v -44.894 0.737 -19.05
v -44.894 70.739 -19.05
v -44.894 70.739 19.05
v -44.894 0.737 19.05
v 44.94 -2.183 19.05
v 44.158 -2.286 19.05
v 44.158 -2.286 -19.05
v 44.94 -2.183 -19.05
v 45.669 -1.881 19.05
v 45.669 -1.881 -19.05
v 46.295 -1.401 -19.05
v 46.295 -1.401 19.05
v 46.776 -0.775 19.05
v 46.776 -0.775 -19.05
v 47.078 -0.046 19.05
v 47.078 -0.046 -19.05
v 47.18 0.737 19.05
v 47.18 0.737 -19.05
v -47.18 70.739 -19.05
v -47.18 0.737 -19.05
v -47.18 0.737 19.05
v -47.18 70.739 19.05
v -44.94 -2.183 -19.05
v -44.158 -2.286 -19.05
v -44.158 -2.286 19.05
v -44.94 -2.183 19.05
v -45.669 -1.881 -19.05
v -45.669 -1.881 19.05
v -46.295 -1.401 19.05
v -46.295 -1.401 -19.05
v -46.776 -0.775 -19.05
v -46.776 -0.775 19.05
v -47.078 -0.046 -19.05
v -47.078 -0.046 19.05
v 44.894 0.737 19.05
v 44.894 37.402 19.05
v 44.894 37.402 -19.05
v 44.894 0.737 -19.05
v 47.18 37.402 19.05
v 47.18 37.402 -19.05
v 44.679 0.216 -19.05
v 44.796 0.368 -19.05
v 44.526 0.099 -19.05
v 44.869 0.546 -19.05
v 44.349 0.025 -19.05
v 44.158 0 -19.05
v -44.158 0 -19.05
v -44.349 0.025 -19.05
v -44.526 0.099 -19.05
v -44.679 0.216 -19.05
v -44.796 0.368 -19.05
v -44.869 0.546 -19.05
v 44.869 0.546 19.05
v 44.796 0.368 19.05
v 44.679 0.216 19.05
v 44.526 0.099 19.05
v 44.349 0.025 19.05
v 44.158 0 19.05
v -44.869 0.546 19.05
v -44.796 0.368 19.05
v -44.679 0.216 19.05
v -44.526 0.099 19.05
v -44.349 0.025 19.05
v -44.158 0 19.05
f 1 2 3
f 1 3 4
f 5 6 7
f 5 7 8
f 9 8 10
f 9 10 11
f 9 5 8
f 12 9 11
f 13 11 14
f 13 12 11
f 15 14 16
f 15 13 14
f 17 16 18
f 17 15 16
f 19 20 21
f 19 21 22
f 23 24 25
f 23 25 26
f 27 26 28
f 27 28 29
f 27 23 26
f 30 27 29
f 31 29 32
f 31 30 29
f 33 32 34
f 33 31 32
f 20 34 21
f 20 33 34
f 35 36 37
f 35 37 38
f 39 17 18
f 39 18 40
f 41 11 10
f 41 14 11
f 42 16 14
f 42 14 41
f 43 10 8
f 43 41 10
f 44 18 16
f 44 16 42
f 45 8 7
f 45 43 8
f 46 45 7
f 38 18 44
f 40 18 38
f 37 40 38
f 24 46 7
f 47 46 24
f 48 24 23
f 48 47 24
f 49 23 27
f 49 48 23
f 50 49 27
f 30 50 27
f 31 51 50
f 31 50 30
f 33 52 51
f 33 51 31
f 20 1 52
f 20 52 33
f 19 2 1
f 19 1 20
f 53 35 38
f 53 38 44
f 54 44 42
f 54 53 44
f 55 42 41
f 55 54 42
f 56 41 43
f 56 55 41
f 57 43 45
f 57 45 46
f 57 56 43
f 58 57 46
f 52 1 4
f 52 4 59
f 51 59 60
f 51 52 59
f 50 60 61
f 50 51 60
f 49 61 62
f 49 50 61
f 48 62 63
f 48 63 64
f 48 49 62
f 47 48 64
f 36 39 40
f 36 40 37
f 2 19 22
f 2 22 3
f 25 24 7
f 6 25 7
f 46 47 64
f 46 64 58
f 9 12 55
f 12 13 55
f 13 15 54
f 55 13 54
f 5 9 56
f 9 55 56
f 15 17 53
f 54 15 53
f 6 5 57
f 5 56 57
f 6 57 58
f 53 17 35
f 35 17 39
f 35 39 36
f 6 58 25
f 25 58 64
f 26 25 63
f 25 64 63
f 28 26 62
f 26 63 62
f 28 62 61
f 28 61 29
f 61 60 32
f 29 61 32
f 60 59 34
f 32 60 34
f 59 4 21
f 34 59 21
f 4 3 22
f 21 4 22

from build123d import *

# Parameters (mm, degrees)
SKETCH1_W                    = 94.361
SKETCH1_H                    = 38.1
BASE_FLANGE1_DEPTH           = 2.286
EDGE_FLANGE1_STRIP_W         = 10.6172
EDGE_FLANGE1_STRIP_H         = 2.286
EDGE_FLANGE1_STRIP_CUT_DEPTH = 38.1
EDGE_FLANGE1_DEPTH           = 38.1
EDGE_FLANGE2_STRIP_W         = 10.6172
EDGE_FLANGE2_STRIP_H         = 2.286
EDGE_FLANGE2_STRIP_CUT_DEPTH = 38.1
EDGE_FLANGE2_DEPTH           = 38.1


# Sheet-metal steps are written as plain solids
with BuildPart() as part:
    # Sketch1 → Base-Flange1 (new body)
    with BuildSketch(Plane(origin=(0, 0, 0), x_dir=(1, 0, 0), z_dir=(0, 1, 0))):
        Rectangle(SKETCH1_W, SKETCH1_H)
    extrude(amount=-BASE_FLANGE1_DEPTH)

    # Edge-Flange1 strip (across the edge) → Edge-Flange1 strip cut (cut)
    with BuildSketch(Plane(origin=(47.1805, 0, 19.05), x_dir=(-1, 0, 0), z_dir=(0, 0, -1))):
        with Locations((-2.286, -1.143)):
            Rectangle(EDGE_FLANGE1_STRIP_W, EDGE_FLANGE1_STRIP_H)
    extrude(amount=EDGE_FLANGE1_STRIP_CUT_DEPTH, mode=Mode.SUBTRACT)

    # Edge-Flange1 section (across the edge) → Edge-Flange1 (add)
    with BuildSketch(Plane(origin=(47.1805, 0, 19.05), x_dir=(-1, 0, 0), z_dir=(0, 0, -1))):
        with BuildLine():
            Line((0, 0.7366), (0, 37.4015))
            Line((0, 37.4015), (2.286, 37.4015))
            Line((2.286, 37.4015), (2.286, 0.7366))
            ThreePointArc((2.286, 0.7366), (2.501745145, 0.215745145), (3.0226, 0))
            Line((3.0226, 0), (3.0226, -2.286))
            ThreePointArc((3.0226, -2.286), (0.885299043, -1.400700957), (0, 0.7366))
        make_face()
    extrude(amount=EDGE_FLANGE1_DEPTH)

    # Edge-Flange2 strip (across the edge) → Edge-Flange2 strip cut (cut)
    with BuildSketch(Plane(origin=(-47.1805, 0, -19.05), x_dir=(1, 0, 0), z_dir=(0, 0, 1))):
        with Locations((-2.286, -1.143)):
            Rectangle(EDGE_FLANGE2_STRIP_W, EDGE_FLANGE2_STRIP_H)
    extrude(amount=EDGE_FLANGE2_STRIP_CUT_DEPTH, mode=Mode.SUBTRACT)

    # Edge-Flange2 section (across the edge) → Edge-Flange2 (add)
    with BuildSketch(Plane(origin=(-47.1805, 0, -19.05), x_dir=(1, 0, 0), z_dir=(0, 0, 1))):
        with BuildLine():
            Line((0, 0.7366), (0, 70.739))
            Line((0, 70.739), (2.286, 70.739))
            Line((2.286, 70.739), (2.286, 0.7366))
            ThreePointArc((2.286, 0.7366), (2.501745145, 0.215745145), (3.0226, 0))
            Line((3.0226, 0), (3.0226, -2.286))
            ThreePointArc((3.0226, -2.286), (0.885299043, -1.400700957), (0, 0.7366))
        make_face()
    extrude(amount=EDGE_FLANGE2_DEPTH)


solid = part.part
